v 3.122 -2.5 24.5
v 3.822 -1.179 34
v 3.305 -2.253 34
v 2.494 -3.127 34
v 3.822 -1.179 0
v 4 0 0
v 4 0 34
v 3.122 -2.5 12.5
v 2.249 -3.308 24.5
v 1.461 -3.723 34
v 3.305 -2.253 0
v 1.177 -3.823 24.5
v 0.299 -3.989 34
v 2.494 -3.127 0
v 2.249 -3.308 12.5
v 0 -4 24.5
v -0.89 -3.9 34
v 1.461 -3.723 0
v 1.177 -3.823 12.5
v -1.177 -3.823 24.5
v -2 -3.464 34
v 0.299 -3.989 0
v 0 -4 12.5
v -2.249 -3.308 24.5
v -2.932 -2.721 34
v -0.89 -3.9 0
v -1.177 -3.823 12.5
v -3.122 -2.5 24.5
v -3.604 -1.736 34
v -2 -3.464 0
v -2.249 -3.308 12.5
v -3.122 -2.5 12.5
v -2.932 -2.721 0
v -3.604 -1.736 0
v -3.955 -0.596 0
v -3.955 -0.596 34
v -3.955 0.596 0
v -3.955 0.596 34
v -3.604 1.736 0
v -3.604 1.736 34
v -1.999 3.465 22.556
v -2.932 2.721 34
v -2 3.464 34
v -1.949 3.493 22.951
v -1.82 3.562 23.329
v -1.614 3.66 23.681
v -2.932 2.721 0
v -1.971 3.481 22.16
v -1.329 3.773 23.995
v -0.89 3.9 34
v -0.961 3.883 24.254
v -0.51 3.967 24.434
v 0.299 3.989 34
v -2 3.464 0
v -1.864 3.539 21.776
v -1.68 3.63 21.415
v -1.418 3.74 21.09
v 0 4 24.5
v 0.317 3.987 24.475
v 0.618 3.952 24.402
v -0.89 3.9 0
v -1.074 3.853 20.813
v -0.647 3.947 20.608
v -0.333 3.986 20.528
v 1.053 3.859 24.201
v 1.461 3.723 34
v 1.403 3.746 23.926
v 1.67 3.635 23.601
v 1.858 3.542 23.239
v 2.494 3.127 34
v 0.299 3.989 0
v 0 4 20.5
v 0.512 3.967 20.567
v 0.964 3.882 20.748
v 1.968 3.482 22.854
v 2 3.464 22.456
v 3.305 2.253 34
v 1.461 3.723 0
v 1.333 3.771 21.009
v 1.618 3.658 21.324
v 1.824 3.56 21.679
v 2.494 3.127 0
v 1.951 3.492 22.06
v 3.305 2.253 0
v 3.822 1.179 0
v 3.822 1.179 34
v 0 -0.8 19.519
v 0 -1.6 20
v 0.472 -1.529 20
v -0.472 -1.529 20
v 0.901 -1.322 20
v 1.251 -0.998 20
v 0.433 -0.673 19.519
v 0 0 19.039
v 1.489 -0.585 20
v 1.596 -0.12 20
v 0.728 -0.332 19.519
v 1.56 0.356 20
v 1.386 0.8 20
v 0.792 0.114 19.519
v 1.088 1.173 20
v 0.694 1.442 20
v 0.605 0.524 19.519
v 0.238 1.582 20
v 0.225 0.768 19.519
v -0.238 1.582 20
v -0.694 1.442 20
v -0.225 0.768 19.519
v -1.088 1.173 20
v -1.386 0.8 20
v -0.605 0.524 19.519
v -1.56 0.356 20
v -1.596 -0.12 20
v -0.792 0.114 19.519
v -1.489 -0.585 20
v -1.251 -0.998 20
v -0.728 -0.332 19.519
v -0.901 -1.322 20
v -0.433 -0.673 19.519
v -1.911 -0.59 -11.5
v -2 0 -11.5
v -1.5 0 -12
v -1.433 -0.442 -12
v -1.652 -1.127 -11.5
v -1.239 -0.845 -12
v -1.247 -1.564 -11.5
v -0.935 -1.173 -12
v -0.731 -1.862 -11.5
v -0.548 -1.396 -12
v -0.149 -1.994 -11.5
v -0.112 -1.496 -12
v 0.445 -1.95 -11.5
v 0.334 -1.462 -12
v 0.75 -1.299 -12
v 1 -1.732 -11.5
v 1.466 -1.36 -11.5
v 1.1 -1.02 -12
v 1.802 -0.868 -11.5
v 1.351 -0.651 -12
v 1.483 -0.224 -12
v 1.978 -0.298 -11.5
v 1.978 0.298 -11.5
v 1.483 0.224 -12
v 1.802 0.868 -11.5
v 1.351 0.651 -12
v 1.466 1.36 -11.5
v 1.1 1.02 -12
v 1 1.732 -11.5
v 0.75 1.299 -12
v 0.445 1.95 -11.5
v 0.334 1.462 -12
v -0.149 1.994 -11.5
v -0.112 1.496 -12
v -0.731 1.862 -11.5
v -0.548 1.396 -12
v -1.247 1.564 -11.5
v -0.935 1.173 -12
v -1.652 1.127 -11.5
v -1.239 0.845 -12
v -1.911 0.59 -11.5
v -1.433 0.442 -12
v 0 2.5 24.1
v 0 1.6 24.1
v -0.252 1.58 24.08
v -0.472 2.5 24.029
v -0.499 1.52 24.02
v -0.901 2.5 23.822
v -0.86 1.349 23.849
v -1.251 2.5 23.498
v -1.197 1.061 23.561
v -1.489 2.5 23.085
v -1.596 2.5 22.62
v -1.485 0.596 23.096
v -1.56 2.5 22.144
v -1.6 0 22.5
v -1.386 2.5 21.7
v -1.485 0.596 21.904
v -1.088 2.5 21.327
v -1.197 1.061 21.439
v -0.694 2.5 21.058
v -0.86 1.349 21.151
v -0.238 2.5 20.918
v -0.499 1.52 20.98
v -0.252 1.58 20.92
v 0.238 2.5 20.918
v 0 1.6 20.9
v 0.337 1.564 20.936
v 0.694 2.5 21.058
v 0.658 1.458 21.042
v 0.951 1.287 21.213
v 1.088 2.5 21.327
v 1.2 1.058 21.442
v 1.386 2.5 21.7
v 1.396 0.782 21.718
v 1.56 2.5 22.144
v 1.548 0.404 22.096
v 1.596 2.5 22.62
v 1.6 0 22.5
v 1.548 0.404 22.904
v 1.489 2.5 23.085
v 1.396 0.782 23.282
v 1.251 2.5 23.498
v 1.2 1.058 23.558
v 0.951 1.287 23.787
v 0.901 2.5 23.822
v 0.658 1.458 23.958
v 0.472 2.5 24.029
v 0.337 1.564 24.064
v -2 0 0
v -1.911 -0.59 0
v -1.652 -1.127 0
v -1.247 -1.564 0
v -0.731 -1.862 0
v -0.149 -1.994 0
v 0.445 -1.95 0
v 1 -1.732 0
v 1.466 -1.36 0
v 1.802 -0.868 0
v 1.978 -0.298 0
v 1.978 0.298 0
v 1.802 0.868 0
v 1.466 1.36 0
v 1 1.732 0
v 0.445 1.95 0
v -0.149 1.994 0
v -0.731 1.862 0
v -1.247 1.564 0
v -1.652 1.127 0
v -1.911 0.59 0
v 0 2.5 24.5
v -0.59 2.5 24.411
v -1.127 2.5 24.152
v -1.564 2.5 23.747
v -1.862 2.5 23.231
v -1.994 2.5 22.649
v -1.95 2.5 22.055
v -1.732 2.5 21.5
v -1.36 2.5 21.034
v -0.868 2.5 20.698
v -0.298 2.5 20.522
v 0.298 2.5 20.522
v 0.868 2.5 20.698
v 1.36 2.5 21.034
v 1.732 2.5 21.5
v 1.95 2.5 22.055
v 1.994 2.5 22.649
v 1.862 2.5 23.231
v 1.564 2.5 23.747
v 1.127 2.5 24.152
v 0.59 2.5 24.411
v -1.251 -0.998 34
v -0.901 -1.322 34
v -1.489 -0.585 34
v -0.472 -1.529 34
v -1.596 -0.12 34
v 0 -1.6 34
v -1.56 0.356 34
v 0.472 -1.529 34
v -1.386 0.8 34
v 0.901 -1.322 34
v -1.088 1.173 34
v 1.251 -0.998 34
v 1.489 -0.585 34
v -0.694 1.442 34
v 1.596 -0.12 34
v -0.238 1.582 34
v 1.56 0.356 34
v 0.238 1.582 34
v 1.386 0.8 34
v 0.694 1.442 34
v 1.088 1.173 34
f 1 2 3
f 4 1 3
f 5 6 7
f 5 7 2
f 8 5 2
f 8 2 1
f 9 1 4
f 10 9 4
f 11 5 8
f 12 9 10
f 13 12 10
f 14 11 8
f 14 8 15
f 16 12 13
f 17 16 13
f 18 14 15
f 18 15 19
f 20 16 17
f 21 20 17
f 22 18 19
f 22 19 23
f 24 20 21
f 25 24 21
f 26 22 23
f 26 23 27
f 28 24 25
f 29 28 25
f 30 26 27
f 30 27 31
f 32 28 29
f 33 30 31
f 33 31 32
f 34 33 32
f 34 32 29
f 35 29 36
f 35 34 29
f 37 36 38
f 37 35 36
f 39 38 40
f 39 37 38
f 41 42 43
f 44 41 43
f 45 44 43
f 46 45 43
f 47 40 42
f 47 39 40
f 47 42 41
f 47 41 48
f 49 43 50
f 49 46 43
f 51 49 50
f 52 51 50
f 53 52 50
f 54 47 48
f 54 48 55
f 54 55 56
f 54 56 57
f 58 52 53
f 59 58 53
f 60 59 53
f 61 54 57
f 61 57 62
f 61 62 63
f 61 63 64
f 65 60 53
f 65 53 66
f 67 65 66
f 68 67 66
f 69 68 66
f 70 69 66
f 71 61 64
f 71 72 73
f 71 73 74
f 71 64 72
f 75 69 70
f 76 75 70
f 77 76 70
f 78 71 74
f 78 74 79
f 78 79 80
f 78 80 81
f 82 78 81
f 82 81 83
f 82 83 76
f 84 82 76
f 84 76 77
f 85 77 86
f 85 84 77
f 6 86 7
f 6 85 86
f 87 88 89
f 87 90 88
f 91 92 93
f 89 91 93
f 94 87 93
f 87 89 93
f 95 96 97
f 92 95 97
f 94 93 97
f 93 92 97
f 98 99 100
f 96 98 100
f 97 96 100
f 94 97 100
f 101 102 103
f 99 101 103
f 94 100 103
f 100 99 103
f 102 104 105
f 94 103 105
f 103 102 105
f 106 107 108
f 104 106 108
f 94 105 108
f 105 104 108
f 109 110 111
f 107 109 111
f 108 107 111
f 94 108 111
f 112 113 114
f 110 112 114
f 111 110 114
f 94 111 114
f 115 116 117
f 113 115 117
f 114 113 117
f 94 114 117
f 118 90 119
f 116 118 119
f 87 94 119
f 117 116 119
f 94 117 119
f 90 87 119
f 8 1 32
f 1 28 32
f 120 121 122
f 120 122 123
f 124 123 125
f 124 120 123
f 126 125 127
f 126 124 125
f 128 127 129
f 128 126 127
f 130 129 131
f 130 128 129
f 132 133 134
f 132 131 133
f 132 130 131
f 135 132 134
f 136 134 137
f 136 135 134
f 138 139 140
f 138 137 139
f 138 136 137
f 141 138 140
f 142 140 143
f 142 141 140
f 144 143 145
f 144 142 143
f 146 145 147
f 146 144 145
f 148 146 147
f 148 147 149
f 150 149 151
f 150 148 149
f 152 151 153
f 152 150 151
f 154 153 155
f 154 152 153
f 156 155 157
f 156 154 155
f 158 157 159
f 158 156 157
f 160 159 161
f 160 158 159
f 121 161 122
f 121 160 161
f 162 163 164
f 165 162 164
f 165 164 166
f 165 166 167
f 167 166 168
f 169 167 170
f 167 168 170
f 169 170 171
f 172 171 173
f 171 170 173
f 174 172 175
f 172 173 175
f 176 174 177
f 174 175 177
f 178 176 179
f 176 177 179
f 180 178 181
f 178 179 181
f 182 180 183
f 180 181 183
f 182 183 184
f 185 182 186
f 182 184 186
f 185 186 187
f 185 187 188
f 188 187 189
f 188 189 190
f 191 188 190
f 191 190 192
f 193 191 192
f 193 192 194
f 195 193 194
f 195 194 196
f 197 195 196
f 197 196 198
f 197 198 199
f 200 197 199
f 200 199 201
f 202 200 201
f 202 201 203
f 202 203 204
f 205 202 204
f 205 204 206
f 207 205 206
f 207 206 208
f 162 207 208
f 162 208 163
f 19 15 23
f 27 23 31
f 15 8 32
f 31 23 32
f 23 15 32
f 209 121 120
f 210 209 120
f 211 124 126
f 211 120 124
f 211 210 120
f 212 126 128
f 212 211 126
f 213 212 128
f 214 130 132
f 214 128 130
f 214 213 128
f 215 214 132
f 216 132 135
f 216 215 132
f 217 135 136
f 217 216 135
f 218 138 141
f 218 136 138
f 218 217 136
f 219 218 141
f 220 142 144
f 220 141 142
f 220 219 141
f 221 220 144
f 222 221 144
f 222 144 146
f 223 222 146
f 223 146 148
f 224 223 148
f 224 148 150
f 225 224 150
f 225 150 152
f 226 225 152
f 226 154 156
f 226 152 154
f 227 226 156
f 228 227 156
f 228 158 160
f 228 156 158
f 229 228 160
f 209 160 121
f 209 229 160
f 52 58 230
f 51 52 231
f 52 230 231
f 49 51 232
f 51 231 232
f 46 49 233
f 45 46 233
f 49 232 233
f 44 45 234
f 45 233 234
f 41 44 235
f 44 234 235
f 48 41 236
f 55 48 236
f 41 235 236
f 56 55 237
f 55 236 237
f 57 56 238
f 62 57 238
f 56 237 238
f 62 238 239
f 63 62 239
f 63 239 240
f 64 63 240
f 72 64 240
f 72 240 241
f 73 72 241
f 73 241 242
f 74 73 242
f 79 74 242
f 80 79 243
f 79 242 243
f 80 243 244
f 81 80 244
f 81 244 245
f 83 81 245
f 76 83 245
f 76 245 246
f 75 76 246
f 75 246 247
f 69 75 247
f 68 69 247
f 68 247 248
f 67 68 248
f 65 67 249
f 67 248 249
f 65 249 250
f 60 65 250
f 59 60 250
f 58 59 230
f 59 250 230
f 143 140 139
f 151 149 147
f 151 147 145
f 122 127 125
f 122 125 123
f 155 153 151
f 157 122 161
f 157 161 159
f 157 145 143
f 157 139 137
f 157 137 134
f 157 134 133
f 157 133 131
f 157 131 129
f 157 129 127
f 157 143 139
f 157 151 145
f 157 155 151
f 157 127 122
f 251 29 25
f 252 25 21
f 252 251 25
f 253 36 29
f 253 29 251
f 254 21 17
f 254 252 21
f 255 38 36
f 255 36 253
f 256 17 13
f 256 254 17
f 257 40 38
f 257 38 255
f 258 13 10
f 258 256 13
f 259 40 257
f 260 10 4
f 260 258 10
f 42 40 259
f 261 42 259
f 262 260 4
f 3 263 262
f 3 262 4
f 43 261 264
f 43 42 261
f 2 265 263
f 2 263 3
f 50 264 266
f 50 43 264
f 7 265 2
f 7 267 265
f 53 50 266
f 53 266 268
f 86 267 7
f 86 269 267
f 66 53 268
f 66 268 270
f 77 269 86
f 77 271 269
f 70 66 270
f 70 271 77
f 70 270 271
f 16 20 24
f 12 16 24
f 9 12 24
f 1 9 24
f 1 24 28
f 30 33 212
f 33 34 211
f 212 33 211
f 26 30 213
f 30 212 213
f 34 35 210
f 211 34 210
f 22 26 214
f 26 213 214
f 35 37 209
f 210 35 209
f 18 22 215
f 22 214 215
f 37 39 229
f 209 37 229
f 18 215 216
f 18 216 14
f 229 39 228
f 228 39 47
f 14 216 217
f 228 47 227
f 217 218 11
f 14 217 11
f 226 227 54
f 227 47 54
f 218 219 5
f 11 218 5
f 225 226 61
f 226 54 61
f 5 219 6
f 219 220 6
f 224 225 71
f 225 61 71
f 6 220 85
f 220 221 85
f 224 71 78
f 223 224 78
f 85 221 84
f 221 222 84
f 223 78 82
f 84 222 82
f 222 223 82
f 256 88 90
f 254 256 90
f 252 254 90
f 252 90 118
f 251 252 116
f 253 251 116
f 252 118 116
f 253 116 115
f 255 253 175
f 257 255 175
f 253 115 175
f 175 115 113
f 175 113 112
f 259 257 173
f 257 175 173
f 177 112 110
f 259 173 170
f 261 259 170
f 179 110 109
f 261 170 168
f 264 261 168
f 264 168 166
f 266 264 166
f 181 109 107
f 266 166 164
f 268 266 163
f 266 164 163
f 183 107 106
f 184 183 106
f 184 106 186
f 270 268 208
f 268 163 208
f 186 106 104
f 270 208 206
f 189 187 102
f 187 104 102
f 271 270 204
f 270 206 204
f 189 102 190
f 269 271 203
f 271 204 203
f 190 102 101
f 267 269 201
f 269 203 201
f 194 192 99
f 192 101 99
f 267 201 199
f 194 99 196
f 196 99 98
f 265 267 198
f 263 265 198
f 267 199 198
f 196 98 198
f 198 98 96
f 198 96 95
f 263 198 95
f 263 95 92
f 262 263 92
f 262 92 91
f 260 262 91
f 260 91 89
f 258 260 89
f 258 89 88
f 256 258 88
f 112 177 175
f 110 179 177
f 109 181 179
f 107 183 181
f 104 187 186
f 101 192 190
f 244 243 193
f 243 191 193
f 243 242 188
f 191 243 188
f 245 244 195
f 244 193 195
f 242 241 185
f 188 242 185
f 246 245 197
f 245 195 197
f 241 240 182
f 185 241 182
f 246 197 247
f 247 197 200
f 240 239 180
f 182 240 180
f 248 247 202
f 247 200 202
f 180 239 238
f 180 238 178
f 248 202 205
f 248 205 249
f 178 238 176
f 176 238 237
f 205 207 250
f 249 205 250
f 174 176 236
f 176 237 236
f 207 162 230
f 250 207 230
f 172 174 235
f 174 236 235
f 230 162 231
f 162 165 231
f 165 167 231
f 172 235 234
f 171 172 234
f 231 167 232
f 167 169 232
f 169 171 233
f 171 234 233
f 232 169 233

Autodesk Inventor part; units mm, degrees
sketch "Sketch1" plane through (0, 0, 0) normal (0, 0, 1) x (1, 0, 0)
  circle A0 centre (0, 0) radius 4
  dimension "d0" = 8
extrude "Extrusion1" add sketch "Sketch1" along normal blind 34
sketch "Sketch2" plane through (0, 0, 0) normal (0, 0, -1) x (-1, 0, 0)
  circle A0 centre (0, 0) radius 2
  dimension "d3" = 4
extrude "Extrusion2" add sketch "Sketch2" along normal blind 12
chamfer "Chamfer1" distance 0.5 angle 45 1 edges at (2, 0, -12)
sketch "Sketch3" plane through (0, 0, 34) normal (0, 0, 1) x (1, 0, 0)
  line L0 (0, 0) -> (0, 4)
  circle A0 centre (0, 0) radius 4 projected
hole "Hole1" at (0, 0, 34) direction (0, 0, -1) diameter 3.2 depth 14 tip angle 118
ref_plane "Work Plane1" through (0, 4, 34) normal (0, 1, 0) x (-1, 0, 0)
ref_plane "Work Plane2" through (0, 0, 0) normal (1, 0, 0) x (0, 1, 0)
sketch "Sketch5" plane through (0, 0, 0) normal (1, 0, 0) x (0, 1, 0)
  line L0 (-4, 0) -> (-4, 34) projected
  line L1 (-4, 24.5) -> (-2.5, 24.5)
  line L2 (-2.5, 24.5) -> (-2.5, 12.5)
  line L3 (-2.5, 12.5) -> (-4, 12.5)
  line L4 (-4, 12.5) -> (-4, 24.5)
  line L5 (4, 34) -> (-4, 34) projected
  point P0 (0, 0)
  dimension "d19" = 12
  dimension "d20" = 9.5
  dimension "d21" = 1.5
extrude "Extrusion3" cut sketch "Sketch5" along normal mid plane 100
ref_plane "Work Plane3" through (0, 4, 0) normal (0, 1, 0) x (-1, 0, 0)
sketch "Sketch6" plane through (0, 4, 0) normal (0, 1, 0) x (-1, 0, 0)
  line L0 (4, 34) -> (-4, 34) projected
  line L1 (0, 34) -> (0, 22.5)
  point P0 (0, 0)
  dimension "d25" = 11.5
hole "Hole2" at (0, 4, 22.5) direction (0, -1, 0) diameter 4 depth 1.5
hole "Hole3" at (0, 4, 22.5) direction (0, -1, 0) diameter 3.2 depth 4 tip angle 118
properties part number "KURBELWELLE PART 7" material "Stainless Steel"
